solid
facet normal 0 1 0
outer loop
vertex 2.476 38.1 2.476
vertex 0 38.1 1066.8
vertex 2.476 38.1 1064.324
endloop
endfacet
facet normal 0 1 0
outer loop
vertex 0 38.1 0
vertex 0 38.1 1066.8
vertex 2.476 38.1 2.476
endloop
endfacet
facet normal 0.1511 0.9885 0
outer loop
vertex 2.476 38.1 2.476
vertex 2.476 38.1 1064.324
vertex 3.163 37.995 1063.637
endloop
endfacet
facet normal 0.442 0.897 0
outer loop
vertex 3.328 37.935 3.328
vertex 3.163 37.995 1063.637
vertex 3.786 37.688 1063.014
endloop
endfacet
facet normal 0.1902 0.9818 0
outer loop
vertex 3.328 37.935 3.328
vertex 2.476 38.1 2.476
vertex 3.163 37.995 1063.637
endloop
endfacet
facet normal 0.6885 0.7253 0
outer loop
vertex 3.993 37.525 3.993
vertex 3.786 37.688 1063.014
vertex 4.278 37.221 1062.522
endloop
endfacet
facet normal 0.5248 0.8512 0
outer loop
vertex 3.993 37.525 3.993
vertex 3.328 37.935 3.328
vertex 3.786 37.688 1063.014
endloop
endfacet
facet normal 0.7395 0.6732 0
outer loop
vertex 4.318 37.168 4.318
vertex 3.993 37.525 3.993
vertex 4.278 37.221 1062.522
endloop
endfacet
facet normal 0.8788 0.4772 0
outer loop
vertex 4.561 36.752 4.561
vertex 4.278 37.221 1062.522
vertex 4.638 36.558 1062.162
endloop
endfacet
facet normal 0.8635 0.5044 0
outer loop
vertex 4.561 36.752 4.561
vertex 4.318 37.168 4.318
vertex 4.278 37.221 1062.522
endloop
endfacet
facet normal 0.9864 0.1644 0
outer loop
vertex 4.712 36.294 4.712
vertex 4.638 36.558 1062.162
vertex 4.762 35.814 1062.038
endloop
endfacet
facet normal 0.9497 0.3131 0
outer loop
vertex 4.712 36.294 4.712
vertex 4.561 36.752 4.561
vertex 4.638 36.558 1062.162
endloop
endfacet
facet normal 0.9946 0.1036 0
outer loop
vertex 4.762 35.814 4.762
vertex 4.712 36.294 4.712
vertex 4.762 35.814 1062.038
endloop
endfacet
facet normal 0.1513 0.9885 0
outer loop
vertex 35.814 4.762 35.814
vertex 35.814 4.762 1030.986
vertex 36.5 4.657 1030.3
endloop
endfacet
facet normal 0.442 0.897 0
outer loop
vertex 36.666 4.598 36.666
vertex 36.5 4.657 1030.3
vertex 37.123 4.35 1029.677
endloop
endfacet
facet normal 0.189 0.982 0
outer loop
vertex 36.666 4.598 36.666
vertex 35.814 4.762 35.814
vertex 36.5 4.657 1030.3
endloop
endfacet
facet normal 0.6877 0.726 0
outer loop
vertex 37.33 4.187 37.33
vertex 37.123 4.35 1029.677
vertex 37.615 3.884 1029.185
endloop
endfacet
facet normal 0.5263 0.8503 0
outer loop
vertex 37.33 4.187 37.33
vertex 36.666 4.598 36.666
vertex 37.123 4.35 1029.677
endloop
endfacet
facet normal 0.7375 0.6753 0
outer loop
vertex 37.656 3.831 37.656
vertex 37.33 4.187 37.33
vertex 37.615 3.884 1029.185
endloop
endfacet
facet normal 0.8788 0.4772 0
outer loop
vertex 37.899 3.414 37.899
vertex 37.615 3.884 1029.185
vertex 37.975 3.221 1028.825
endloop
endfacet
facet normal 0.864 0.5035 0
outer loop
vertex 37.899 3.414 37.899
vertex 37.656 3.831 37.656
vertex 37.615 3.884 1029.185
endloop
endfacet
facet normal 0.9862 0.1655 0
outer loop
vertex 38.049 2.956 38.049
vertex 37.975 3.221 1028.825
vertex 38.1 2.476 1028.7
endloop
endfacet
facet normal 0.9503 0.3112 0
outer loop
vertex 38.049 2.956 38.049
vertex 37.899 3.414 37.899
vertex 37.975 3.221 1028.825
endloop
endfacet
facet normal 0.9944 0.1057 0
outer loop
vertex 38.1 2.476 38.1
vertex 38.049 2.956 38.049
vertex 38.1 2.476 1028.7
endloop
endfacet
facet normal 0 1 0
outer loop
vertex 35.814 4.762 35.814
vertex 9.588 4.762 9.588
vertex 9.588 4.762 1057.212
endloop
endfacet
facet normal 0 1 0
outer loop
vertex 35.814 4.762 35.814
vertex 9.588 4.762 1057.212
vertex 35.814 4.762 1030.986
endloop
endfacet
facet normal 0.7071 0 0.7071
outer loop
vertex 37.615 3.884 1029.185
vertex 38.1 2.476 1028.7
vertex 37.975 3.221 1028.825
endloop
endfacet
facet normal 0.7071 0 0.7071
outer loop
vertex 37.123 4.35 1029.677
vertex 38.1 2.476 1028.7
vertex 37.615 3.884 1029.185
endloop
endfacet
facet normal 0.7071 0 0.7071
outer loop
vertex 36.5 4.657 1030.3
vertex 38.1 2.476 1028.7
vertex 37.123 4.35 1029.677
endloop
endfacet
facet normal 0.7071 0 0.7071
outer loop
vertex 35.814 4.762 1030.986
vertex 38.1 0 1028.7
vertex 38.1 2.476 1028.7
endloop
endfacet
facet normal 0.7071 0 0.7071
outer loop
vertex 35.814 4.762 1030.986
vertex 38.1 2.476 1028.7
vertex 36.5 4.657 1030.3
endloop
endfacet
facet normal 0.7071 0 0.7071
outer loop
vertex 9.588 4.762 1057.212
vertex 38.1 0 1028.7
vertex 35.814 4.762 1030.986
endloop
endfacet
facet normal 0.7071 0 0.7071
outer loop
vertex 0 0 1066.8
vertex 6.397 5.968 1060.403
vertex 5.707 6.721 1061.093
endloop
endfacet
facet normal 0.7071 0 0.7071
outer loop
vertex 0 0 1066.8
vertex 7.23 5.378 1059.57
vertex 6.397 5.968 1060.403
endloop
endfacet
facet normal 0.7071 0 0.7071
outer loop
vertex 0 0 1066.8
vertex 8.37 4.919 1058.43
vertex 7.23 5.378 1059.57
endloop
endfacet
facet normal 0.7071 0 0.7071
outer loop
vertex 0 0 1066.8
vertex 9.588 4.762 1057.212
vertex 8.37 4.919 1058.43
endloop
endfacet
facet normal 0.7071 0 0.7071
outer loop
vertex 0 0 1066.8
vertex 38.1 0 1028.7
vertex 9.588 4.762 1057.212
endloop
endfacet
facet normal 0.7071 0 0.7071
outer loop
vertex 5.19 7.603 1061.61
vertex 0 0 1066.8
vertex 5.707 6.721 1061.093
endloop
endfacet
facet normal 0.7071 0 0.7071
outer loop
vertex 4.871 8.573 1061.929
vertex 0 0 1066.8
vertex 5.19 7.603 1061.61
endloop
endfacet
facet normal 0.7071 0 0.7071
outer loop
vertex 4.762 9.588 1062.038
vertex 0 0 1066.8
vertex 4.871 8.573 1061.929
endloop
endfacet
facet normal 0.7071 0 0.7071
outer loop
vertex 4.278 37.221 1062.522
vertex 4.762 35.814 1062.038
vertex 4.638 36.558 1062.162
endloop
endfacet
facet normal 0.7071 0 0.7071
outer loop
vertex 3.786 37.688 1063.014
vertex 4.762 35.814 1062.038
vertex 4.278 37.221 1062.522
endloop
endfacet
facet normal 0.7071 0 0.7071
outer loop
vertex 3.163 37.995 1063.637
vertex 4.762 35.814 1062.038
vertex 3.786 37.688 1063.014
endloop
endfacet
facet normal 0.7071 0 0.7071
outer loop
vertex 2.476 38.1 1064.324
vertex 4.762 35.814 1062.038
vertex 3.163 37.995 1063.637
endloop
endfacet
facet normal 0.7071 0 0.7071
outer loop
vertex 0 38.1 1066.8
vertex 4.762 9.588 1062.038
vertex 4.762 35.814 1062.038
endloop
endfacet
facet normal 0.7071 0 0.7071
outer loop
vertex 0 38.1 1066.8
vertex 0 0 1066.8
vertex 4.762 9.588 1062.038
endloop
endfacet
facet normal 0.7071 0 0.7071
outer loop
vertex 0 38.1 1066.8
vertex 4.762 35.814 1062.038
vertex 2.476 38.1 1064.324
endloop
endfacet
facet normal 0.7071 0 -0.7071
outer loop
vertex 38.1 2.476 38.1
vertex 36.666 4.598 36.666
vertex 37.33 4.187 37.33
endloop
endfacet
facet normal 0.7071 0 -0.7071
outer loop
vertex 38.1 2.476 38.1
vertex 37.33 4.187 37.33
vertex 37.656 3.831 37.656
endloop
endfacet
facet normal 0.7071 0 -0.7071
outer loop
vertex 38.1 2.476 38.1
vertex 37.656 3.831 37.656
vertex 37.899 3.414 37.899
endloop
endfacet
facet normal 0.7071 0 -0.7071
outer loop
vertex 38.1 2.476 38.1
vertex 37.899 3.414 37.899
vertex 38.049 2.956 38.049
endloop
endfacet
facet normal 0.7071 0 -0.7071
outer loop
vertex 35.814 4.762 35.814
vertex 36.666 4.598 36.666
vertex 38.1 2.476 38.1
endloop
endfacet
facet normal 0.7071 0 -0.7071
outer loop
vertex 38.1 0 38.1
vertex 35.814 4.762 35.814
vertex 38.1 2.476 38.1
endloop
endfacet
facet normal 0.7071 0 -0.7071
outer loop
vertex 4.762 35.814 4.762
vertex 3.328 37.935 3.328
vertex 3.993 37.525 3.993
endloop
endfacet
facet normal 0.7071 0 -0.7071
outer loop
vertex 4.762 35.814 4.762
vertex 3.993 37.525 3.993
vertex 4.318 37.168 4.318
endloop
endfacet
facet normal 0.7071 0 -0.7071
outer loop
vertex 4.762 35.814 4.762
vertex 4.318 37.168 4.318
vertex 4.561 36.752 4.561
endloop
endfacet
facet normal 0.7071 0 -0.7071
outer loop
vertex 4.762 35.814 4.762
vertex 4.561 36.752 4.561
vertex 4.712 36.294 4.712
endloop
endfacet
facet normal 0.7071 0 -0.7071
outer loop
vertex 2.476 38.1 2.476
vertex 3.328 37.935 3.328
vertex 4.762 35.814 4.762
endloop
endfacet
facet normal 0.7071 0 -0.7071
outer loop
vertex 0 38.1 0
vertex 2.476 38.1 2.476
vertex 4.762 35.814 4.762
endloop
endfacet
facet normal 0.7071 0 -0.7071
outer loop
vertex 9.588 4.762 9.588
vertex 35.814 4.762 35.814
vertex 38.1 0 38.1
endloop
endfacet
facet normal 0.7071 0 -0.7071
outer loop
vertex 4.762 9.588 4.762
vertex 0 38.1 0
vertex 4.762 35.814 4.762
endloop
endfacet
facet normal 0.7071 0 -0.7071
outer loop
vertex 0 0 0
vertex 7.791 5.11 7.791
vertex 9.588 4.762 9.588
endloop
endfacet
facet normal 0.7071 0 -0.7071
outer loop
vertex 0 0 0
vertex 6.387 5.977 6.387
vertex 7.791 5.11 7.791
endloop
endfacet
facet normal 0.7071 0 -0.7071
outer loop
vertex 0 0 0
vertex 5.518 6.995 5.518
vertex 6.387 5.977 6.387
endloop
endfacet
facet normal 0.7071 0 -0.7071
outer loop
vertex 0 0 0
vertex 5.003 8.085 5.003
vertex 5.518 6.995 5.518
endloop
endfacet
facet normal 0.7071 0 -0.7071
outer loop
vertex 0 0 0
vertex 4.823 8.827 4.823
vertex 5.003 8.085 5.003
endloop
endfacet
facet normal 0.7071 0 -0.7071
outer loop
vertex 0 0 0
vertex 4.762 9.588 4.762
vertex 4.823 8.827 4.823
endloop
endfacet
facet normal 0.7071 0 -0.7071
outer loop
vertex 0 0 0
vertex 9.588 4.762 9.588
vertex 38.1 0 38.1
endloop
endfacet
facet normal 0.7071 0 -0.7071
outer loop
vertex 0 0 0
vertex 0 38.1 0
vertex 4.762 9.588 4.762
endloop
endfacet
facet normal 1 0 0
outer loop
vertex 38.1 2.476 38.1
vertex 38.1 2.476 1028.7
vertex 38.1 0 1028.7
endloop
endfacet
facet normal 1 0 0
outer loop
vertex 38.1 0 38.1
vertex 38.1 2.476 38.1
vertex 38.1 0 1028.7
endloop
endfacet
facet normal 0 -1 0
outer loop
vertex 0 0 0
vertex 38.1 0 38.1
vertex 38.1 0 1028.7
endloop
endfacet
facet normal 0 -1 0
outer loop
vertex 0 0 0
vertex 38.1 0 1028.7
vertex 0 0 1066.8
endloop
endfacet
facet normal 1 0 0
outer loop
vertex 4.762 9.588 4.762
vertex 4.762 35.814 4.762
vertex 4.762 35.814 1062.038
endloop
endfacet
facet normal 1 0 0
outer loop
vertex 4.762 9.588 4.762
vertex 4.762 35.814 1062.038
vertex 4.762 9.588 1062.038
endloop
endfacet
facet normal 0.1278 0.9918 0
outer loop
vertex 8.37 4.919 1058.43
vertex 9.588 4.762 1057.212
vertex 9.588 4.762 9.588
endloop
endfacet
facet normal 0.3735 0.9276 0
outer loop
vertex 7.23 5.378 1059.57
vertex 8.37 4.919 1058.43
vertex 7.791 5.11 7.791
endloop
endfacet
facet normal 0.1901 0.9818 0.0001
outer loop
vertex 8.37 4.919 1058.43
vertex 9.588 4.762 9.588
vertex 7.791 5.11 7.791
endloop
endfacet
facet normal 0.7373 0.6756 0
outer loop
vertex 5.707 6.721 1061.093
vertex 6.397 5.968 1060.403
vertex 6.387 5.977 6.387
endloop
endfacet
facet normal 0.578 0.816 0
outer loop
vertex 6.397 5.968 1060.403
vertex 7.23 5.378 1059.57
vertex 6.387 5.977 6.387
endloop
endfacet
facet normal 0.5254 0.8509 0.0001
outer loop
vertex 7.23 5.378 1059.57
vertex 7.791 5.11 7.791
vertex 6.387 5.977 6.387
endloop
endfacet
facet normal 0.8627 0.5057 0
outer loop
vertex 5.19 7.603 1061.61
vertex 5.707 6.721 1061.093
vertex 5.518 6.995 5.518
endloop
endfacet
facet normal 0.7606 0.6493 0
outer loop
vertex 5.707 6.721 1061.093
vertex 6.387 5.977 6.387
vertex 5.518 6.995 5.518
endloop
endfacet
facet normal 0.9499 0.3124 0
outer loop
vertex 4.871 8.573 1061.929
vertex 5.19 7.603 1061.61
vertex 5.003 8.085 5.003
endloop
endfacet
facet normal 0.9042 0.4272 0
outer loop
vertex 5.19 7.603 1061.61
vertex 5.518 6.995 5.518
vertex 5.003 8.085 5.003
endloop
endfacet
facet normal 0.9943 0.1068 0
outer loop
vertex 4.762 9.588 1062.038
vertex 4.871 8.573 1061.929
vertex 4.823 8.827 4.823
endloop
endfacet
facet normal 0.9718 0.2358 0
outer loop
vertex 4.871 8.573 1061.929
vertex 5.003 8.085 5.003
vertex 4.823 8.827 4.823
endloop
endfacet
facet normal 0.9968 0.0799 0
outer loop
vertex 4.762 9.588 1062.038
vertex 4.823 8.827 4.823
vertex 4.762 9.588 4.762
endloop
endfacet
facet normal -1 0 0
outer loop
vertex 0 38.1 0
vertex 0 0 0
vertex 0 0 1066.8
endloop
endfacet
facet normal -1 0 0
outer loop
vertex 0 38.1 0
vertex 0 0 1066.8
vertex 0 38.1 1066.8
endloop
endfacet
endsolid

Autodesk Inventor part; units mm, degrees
ref_plane "Start plane" through (0, 0, 0) normal (0, 0, 1) x (1, 0, 0)
ref_plane "End plane" through (0, 0, 1066.8) normal (0, 0, 1) x (1, 0, 0)
sketch "Sketch" plane through (0, 0, 0) normal (0, 0, 1) x (1, 0, 0)
  line L0 (38.1, 0) -> (0, 0)
  line L1 (0, 0) -> (0, 38.1)
  line L2 (0, 38.1) -> (2.4765, 38.1)
  line L3 (4.7625, 35.814) -> (4.7625, 9.5885)
  line L4 (9.5885, 4.7625) -> (35.814, 4.7625)
  line L5 (38.1, 2.4765) -> (38.1, 0)
  line L6 (0, -11.0414) -> (0, 31.5385) construction
  line L7 (-11.0414, 0) -> (31.5385, 0) construction
  arc A0 (4.7625, 9.5885) -> (9.5885, 4.7625) centre (9.5885, 9.5885) ccw
  arc A1 (4.7625, 35.814) -> (2.4765, 38.1) centre (2.4765, 35.814) ccw
  arc A2 (38.1, 2.4765) -> (35.814, 4.7625) centre (35.814, 2.4765) ccw
  line L8 (0, 48.4964) -> (0, -20.9644) construction
  line L9 (-20.9644, 0) -> (48.4964, 0) construction
  point P0 (4.7625, 38.1)
  point P1 (4.7625, 4.7625)
  point P2 (38.1, 4.7625)
  dimension "d0" = 38.1
  dimension "d1" = 38.1
  dimension "d2" = 4.7625
  dimension "d3" = 4.7625
  dimension "d10" = 0
  dimension "d11" = 0
  dimension "d14" = 4.826
  dimension "d15" = 2.286
extrude "Body" add sketch "Sketch" along normal up to surface (1066.8 mm away) from surface at 0
sketch "Sketch3" plane through (0, 0, 0) normal (0, 0, 1) x (1, 0, 0)
  line L0 (0, 0) -> (10, 0)
ref_plane "Work Plane3" through (0, 0, 0) normal (0, -1, 0) x (1, 0, 0)
sketch "Sketch4" plane through (0, 0, 0) normal (0, -1, 0) x (1, 0, 0)
  line L0 (-2, 0) -> (12, 0)
  line L1 (-2, 1066.8) -> (12, 1066.8)
  dimension "d17" = 1066.8
ref_plane "Work Plane4" through (0, 19.05, 1066.8) normal (0.7071, 0, 0.7071) x (0.7071, 0, -0.7071)
split "Split1" plane through (0, 19.05, 1066.8) removes the side toward (0.7071, 0, 0.7071)
ref_plane "Work Plane5" through (0, 19.05, 0) normal (0.7071, 0, -0.7071) x (-0.7071, 0, -0.7071)
split "Split2" plane through (0, 19.05, 0) removes the side toward (0.7071, 0, -0.7071)
equation "\"d0\" = G_H"
equation "\"d1\" = G_H"
equation "\"d2\" = G_T"
equation "\"d3\" = G_T"
equation "\"d14\" = G_IR"
equation "\"d15\" = G_ER"
equation "\"d4\" = G_L"
equation "\"G_H\" = 38.1"
equation "\"G_T\" = 4.7625"
equation "\"G_ER\" = 2.286"
equation "\"G_IR\" = 4.826"
equation "\"G_L\" = d17"
equation "\"ex\" = 0"
equation "\"G_OFFSET_START\" = 0"
equation "\"G_OFFSET_END\" = 0"
equation "\"d13\" = G_OFFSET_END + B_L"
equation "\"B_L\" = 1066.8"
properties part number "AISC - L 1.5 x 1.5 x 3/16 - 42" material "Aluminum 6061-AHC"
